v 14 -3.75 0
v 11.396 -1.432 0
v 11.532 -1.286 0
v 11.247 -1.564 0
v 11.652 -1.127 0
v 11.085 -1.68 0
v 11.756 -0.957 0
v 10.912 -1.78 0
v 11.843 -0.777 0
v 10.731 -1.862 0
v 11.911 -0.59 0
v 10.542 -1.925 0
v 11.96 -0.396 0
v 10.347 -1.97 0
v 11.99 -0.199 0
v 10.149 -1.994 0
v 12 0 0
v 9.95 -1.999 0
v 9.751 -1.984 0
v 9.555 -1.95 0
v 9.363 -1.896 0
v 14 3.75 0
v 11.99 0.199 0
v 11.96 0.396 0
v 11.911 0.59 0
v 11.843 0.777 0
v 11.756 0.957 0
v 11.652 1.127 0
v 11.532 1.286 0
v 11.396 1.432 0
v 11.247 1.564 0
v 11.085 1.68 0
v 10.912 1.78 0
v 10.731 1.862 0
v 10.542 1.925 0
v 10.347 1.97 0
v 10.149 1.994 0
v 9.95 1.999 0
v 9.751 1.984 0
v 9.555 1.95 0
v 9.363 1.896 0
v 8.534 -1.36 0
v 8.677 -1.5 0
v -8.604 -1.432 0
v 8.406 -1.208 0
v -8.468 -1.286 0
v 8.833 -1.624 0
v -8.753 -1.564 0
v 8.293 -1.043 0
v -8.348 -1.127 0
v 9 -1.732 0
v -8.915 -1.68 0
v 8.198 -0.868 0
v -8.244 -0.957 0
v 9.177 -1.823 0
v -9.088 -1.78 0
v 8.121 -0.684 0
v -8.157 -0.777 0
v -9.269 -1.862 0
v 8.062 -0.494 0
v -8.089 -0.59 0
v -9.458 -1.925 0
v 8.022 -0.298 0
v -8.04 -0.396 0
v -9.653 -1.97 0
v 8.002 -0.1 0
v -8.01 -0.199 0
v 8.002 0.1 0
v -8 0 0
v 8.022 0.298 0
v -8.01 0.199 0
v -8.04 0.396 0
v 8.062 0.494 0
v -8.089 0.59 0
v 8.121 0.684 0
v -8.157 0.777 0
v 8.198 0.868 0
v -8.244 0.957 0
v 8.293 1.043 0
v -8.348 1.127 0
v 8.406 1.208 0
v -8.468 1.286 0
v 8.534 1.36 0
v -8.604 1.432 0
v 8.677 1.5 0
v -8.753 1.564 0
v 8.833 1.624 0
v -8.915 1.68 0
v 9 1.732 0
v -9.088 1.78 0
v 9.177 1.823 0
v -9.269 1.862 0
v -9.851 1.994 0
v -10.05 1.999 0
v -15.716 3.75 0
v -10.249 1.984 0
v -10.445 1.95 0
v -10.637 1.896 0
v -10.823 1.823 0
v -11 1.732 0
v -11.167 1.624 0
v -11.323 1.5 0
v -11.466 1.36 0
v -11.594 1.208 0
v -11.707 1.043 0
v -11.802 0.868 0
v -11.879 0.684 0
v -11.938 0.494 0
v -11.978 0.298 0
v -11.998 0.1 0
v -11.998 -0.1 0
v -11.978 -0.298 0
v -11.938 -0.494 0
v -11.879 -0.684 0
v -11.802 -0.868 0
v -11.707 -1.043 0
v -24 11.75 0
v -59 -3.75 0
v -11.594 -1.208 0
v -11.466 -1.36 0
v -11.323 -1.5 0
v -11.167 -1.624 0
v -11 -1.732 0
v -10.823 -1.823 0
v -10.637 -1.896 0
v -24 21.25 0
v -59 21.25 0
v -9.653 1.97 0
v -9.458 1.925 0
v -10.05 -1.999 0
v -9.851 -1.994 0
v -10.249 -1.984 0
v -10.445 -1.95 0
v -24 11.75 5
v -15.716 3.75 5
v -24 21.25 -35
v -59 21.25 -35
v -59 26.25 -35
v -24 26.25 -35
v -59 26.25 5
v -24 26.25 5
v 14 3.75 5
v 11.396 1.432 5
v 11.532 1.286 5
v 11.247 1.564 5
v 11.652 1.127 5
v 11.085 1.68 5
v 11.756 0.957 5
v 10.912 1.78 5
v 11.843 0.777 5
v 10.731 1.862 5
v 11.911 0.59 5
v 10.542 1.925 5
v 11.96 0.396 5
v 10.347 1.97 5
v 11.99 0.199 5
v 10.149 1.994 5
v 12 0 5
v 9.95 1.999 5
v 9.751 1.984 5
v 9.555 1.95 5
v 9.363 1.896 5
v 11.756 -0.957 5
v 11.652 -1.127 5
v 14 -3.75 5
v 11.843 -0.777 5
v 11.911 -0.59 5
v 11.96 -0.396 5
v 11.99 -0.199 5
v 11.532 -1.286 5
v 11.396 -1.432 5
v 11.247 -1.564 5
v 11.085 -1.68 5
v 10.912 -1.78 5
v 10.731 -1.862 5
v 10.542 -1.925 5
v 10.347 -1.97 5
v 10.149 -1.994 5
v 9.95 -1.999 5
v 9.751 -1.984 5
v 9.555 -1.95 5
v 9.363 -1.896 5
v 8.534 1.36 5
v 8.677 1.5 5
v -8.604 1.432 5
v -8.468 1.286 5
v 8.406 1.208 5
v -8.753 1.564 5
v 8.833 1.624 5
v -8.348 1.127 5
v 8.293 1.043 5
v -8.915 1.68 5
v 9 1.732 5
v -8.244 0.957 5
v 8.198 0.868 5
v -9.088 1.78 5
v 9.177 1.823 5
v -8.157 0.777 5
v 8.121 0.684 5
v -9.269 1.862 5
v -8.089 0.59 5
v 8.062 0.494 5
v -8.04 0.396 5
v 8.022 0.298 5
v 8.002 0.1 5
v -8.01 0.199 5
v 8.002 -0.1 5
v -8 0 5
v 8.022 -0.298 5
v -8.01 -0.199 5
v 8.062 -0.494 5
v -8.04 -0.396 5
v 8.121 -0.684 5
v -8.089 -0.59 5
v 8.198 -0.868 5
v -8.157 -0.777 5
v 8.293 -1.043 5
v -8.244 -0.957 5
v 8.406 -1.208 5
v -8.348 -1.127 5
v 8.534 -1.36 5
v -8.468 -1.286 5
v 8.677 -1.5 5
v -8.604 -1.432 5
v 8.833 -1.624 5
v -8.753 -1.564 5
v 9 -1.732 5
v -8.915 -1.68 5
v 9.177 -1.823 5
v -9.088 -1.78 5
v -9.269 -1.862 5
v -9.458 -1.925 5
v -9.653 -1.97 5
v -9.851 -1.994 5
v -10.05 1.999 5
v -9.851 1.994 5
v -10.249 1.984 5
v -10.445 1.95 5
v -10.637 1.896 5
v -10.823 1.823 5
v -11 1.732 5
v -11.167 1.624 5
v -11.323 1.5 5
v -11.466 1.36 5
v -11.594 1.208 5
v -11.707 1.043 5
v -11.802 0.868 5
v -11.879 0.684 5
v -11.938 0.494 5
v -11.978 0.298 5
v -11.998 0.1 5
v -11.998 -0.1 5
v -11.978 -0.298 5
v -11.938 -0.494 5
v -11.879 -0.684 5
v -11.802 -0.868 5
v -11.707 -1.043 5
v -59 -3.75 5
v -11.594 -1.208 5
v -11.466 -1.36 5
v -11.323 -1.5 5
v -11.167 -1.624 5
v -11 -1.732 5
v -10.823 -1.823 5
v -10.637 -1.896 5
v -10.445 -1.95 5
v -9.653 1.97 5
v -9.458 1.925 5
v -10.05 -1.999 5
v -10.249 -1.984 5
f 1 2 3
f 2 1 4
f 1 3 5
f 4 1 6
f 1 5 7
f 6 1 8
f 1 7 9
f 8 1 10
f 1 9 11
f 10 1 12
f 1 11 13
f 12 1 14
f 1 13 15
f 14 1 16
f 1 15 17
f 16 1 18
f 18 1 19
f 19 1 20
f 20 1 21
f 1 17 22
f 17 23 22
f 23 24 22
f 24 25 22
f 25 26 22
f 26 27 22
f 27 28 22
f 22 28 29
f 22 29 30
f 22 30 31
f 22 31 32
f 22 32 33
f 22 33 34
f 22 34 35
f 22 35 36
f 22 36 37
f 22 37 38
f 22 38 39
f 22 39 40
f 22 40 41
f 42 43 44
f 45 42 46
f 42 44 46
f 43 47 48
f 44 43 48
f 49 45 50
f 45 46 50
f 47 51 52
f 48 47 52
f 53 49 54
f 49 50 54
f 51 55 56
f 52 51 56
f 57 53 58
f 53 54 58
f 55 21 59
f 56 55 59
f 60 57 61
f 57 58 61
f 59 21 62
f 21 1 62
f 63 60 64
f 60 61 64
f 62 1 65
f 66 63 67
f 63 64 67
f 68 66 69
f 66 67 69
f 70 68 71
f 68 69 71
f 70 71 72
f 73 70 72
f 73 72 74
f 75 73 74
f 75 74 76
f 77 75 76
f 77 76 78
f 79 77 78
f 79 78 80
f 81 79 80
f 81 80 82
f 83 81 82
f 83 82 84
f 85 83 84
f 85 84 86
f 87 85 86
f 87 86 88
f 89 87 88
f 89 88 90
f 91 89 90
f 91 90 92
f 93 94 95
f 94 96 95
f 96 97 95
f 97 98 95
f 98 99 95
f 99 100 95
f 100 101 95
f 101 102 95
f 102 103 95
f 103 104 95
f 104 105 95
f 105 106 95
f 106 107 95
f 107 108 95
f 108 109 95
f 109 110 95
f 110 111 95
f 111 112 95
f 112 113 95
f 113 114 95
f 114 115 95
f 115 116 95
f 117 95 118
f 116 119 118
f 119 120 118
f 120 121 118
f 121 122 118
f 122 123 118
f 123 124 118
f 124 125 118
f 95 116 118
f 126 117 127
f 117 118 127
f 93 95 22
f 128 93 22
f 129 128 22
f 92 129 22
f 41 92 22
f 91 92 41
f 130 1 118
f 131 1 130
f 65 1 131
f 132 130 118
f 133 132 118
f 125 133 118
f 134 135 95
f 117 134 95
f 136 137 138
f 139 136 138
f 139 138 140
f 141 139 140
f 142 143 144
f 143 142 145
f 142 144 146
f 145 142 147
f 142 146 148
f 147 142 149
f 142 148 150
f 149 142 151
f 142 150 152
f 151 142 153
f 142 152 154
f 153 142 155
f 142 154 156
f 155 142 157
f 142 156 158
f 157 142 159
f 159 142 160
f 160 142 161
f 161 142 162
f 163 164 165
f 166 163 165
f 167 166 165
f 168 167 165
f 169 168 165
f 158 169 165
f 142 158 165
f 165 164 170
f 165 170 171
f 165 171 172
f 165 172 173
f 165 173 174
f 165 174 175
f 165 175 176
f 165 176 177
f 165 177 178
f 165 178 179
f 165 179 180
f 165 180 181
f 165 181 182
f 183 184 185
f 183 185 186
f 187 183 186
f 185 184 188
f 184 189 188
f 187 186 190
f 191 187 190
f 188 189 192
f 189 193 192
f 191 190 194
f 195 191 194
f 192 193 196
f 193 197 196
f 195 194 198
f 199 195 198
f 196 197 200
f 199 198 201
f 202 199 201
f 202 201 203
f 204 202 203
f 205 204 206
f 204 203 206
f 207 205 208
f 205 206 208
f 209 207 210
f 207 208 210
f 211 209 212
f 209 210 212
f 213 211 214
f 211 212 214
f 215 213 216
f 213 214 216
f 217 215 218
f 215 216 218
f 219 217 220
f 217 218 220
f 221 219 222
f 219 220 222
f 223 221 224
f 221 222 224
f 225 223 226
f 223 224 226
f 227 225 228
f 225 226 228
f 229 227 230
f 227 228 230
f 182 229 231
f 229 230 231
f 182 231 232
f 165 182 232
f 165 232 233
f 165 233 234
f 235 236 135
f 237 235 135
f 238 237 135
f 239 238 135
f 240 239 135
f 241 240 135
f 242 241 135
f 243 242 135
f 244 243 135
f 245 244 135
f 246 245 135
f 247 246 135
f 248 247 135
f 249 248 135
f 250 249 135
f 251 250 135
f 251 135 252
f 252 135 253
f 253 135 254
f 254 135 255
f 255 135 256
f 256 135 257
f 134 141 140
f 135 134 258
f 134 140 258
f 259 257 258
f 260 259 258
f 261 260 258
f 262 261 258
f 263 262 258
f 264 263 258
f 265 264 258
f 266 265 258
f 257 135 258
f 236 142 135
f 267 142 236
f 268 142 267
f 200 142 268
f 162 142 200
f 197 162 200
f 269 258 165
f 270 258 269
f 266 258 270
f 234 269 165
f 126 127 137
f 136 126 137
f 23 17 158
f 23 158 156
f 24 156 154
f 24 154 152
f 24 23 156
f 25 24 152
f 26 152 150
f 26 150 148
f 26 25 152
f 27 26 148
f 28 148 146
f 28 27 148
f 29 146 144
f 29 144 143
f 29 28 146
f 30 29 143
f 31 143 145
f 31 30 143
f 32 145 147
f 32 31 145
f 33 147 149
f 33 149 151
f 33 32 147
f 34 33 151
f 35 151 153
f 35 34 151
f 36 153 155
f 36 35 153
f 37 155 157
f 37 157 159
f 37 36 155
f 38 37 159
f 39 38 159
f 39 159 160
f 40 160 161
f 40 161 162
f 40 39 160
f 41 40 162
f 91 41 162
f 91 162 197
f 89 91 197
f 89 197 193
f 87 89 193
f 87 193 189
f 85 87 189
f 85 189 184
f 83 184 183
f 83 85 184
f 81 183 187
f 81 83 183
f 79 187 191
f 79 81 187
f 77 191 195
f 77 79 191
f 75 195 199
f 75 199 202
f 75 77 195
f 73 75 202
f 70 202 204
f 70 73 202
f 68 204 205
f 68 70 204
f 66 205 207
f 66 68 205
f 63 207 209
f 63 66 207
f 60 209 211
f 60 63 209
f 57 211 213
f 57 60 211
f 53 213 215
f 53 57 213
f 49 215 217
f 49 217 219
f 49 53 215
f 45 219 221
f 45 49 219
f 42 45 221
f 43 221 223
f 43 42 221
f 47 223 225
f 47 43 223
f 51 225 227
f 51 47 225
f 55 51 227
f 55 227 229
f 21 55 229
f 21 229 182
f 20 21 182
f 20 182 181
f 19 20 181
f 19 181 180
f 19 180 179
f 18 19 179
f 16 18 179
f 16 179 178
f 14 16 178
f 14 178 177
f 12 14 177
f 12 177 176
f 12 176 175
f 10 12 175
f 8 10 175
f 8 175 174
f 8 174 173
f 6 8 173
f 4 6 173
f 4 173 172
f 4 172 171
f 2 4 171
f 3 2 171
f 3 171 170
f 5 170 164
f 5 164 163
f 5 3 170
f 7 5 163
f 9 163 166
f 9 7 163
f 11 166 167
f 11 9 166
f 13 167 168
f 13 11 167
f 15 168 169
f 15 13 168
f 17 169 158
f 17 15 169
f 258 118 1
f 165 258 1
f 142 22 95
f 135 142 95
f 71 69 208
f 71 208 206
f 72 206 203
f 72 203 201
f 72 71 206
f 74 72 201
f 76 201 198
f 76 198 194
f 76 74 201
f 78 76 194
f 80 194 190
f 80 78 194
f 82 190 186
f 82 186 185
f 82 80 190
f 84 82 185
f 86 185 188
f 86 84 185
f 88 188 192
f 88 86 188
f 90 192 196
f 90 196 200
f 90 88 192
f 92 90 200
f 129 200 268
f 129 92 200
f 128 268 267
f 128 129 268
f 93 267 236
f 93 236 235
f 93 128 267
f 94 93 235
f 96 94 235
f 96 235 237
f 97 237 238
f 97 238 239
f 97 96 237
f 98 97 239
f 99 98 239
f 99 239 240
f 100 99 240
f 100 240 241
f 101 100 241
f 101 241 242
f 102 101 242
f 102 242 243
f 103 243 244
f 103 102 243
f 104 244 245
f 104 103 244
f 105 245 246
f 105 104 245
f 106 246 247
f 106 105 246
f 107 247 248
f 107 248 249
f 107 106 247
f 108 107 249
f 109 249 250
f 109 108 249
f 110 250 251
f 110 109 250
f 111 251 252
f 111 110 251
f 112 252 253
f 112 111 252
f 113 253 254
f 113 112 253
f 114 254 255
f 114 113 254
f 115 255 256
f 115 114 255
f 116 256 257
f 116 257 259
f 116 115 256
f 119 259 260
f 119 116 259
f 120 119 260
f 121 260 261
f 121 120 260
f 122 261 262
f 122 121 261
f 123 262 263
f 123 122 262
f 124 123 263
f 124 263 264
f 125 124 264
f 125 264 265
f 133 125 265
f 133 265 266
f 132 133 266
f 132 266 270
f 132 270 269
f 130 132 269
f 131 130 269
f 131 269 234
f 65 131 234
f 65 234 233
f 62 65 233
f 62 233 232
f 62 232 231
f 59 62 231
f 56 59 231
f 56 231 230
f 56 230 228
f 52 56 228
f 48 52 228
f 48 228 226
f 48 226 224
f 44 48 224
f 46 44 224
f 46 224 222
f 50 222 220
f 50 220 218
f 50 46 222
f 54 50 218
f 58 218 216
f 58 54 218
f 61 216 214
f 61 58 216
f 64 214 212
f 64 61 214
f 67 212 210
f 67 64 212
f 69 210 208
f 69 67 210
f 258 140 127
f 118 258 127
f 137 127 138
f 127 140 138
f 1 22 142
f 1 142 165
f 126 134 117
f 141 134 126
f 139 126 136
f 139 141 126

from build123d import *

# Parameters (mm, degrees)
SKETCH1_R           = 2
BOSS_EXTRUDE1_DEPTH = 5
BOSS_EXTRUDE2_DEPTH = 35
CHAMFER1_SIZE       = 8
CHAMFER1_SIZE2      = 8.28424251


with BuildPart() as part:
    # Sketch1 → Boss-Extrude1 (new body)
    with BuildSketch(Plane.XY):
        Polygon((-14, 3.75), (14, 3.75), (14, -3.75), (-14, -3.75), (-59, -3.75), (-59, 3.75), align=None)
        with Locations((-10, 0)):
            Circle(SKETCH1_R, mode=Mode.SUBTRACT)
        with Locations((10, 0)):
            Circle(SKETCH1_R, mode=Mode.SUBTRACT)
    extrude(amount=BOSS_EXTRUDE1_DEPTH)

    # Sketch2 → Boss-Extrude2 (add)
    with BuildSketch(Plane.ZY.offset(59)):
        Polygon((0, 3.75), (0, 21.25), (-35, 21.25), (-35, 26.25), (5, 26.25), (5, 3.75), align=None)
    extrude(amount=-BOSS_EXTRUDE2_DEPTH)

    # Chamfer1
    chamfer1_edges = [part.edges().sort_by_distance(p)[0] for p in [
        (-24, 3.75, 2.5),
    ]]
    chamfer1_side = [part.faces().sort_by_distance(p)[0] for p in [
        (-24, 12.5, 0.458938994),
    ]]
    chamfer(chamfer1_edges, length=CHAMFER1_SIZE, length2=CHAMFER1_SIZE2, reference=chamfer1_side[0])


solid = part.part
